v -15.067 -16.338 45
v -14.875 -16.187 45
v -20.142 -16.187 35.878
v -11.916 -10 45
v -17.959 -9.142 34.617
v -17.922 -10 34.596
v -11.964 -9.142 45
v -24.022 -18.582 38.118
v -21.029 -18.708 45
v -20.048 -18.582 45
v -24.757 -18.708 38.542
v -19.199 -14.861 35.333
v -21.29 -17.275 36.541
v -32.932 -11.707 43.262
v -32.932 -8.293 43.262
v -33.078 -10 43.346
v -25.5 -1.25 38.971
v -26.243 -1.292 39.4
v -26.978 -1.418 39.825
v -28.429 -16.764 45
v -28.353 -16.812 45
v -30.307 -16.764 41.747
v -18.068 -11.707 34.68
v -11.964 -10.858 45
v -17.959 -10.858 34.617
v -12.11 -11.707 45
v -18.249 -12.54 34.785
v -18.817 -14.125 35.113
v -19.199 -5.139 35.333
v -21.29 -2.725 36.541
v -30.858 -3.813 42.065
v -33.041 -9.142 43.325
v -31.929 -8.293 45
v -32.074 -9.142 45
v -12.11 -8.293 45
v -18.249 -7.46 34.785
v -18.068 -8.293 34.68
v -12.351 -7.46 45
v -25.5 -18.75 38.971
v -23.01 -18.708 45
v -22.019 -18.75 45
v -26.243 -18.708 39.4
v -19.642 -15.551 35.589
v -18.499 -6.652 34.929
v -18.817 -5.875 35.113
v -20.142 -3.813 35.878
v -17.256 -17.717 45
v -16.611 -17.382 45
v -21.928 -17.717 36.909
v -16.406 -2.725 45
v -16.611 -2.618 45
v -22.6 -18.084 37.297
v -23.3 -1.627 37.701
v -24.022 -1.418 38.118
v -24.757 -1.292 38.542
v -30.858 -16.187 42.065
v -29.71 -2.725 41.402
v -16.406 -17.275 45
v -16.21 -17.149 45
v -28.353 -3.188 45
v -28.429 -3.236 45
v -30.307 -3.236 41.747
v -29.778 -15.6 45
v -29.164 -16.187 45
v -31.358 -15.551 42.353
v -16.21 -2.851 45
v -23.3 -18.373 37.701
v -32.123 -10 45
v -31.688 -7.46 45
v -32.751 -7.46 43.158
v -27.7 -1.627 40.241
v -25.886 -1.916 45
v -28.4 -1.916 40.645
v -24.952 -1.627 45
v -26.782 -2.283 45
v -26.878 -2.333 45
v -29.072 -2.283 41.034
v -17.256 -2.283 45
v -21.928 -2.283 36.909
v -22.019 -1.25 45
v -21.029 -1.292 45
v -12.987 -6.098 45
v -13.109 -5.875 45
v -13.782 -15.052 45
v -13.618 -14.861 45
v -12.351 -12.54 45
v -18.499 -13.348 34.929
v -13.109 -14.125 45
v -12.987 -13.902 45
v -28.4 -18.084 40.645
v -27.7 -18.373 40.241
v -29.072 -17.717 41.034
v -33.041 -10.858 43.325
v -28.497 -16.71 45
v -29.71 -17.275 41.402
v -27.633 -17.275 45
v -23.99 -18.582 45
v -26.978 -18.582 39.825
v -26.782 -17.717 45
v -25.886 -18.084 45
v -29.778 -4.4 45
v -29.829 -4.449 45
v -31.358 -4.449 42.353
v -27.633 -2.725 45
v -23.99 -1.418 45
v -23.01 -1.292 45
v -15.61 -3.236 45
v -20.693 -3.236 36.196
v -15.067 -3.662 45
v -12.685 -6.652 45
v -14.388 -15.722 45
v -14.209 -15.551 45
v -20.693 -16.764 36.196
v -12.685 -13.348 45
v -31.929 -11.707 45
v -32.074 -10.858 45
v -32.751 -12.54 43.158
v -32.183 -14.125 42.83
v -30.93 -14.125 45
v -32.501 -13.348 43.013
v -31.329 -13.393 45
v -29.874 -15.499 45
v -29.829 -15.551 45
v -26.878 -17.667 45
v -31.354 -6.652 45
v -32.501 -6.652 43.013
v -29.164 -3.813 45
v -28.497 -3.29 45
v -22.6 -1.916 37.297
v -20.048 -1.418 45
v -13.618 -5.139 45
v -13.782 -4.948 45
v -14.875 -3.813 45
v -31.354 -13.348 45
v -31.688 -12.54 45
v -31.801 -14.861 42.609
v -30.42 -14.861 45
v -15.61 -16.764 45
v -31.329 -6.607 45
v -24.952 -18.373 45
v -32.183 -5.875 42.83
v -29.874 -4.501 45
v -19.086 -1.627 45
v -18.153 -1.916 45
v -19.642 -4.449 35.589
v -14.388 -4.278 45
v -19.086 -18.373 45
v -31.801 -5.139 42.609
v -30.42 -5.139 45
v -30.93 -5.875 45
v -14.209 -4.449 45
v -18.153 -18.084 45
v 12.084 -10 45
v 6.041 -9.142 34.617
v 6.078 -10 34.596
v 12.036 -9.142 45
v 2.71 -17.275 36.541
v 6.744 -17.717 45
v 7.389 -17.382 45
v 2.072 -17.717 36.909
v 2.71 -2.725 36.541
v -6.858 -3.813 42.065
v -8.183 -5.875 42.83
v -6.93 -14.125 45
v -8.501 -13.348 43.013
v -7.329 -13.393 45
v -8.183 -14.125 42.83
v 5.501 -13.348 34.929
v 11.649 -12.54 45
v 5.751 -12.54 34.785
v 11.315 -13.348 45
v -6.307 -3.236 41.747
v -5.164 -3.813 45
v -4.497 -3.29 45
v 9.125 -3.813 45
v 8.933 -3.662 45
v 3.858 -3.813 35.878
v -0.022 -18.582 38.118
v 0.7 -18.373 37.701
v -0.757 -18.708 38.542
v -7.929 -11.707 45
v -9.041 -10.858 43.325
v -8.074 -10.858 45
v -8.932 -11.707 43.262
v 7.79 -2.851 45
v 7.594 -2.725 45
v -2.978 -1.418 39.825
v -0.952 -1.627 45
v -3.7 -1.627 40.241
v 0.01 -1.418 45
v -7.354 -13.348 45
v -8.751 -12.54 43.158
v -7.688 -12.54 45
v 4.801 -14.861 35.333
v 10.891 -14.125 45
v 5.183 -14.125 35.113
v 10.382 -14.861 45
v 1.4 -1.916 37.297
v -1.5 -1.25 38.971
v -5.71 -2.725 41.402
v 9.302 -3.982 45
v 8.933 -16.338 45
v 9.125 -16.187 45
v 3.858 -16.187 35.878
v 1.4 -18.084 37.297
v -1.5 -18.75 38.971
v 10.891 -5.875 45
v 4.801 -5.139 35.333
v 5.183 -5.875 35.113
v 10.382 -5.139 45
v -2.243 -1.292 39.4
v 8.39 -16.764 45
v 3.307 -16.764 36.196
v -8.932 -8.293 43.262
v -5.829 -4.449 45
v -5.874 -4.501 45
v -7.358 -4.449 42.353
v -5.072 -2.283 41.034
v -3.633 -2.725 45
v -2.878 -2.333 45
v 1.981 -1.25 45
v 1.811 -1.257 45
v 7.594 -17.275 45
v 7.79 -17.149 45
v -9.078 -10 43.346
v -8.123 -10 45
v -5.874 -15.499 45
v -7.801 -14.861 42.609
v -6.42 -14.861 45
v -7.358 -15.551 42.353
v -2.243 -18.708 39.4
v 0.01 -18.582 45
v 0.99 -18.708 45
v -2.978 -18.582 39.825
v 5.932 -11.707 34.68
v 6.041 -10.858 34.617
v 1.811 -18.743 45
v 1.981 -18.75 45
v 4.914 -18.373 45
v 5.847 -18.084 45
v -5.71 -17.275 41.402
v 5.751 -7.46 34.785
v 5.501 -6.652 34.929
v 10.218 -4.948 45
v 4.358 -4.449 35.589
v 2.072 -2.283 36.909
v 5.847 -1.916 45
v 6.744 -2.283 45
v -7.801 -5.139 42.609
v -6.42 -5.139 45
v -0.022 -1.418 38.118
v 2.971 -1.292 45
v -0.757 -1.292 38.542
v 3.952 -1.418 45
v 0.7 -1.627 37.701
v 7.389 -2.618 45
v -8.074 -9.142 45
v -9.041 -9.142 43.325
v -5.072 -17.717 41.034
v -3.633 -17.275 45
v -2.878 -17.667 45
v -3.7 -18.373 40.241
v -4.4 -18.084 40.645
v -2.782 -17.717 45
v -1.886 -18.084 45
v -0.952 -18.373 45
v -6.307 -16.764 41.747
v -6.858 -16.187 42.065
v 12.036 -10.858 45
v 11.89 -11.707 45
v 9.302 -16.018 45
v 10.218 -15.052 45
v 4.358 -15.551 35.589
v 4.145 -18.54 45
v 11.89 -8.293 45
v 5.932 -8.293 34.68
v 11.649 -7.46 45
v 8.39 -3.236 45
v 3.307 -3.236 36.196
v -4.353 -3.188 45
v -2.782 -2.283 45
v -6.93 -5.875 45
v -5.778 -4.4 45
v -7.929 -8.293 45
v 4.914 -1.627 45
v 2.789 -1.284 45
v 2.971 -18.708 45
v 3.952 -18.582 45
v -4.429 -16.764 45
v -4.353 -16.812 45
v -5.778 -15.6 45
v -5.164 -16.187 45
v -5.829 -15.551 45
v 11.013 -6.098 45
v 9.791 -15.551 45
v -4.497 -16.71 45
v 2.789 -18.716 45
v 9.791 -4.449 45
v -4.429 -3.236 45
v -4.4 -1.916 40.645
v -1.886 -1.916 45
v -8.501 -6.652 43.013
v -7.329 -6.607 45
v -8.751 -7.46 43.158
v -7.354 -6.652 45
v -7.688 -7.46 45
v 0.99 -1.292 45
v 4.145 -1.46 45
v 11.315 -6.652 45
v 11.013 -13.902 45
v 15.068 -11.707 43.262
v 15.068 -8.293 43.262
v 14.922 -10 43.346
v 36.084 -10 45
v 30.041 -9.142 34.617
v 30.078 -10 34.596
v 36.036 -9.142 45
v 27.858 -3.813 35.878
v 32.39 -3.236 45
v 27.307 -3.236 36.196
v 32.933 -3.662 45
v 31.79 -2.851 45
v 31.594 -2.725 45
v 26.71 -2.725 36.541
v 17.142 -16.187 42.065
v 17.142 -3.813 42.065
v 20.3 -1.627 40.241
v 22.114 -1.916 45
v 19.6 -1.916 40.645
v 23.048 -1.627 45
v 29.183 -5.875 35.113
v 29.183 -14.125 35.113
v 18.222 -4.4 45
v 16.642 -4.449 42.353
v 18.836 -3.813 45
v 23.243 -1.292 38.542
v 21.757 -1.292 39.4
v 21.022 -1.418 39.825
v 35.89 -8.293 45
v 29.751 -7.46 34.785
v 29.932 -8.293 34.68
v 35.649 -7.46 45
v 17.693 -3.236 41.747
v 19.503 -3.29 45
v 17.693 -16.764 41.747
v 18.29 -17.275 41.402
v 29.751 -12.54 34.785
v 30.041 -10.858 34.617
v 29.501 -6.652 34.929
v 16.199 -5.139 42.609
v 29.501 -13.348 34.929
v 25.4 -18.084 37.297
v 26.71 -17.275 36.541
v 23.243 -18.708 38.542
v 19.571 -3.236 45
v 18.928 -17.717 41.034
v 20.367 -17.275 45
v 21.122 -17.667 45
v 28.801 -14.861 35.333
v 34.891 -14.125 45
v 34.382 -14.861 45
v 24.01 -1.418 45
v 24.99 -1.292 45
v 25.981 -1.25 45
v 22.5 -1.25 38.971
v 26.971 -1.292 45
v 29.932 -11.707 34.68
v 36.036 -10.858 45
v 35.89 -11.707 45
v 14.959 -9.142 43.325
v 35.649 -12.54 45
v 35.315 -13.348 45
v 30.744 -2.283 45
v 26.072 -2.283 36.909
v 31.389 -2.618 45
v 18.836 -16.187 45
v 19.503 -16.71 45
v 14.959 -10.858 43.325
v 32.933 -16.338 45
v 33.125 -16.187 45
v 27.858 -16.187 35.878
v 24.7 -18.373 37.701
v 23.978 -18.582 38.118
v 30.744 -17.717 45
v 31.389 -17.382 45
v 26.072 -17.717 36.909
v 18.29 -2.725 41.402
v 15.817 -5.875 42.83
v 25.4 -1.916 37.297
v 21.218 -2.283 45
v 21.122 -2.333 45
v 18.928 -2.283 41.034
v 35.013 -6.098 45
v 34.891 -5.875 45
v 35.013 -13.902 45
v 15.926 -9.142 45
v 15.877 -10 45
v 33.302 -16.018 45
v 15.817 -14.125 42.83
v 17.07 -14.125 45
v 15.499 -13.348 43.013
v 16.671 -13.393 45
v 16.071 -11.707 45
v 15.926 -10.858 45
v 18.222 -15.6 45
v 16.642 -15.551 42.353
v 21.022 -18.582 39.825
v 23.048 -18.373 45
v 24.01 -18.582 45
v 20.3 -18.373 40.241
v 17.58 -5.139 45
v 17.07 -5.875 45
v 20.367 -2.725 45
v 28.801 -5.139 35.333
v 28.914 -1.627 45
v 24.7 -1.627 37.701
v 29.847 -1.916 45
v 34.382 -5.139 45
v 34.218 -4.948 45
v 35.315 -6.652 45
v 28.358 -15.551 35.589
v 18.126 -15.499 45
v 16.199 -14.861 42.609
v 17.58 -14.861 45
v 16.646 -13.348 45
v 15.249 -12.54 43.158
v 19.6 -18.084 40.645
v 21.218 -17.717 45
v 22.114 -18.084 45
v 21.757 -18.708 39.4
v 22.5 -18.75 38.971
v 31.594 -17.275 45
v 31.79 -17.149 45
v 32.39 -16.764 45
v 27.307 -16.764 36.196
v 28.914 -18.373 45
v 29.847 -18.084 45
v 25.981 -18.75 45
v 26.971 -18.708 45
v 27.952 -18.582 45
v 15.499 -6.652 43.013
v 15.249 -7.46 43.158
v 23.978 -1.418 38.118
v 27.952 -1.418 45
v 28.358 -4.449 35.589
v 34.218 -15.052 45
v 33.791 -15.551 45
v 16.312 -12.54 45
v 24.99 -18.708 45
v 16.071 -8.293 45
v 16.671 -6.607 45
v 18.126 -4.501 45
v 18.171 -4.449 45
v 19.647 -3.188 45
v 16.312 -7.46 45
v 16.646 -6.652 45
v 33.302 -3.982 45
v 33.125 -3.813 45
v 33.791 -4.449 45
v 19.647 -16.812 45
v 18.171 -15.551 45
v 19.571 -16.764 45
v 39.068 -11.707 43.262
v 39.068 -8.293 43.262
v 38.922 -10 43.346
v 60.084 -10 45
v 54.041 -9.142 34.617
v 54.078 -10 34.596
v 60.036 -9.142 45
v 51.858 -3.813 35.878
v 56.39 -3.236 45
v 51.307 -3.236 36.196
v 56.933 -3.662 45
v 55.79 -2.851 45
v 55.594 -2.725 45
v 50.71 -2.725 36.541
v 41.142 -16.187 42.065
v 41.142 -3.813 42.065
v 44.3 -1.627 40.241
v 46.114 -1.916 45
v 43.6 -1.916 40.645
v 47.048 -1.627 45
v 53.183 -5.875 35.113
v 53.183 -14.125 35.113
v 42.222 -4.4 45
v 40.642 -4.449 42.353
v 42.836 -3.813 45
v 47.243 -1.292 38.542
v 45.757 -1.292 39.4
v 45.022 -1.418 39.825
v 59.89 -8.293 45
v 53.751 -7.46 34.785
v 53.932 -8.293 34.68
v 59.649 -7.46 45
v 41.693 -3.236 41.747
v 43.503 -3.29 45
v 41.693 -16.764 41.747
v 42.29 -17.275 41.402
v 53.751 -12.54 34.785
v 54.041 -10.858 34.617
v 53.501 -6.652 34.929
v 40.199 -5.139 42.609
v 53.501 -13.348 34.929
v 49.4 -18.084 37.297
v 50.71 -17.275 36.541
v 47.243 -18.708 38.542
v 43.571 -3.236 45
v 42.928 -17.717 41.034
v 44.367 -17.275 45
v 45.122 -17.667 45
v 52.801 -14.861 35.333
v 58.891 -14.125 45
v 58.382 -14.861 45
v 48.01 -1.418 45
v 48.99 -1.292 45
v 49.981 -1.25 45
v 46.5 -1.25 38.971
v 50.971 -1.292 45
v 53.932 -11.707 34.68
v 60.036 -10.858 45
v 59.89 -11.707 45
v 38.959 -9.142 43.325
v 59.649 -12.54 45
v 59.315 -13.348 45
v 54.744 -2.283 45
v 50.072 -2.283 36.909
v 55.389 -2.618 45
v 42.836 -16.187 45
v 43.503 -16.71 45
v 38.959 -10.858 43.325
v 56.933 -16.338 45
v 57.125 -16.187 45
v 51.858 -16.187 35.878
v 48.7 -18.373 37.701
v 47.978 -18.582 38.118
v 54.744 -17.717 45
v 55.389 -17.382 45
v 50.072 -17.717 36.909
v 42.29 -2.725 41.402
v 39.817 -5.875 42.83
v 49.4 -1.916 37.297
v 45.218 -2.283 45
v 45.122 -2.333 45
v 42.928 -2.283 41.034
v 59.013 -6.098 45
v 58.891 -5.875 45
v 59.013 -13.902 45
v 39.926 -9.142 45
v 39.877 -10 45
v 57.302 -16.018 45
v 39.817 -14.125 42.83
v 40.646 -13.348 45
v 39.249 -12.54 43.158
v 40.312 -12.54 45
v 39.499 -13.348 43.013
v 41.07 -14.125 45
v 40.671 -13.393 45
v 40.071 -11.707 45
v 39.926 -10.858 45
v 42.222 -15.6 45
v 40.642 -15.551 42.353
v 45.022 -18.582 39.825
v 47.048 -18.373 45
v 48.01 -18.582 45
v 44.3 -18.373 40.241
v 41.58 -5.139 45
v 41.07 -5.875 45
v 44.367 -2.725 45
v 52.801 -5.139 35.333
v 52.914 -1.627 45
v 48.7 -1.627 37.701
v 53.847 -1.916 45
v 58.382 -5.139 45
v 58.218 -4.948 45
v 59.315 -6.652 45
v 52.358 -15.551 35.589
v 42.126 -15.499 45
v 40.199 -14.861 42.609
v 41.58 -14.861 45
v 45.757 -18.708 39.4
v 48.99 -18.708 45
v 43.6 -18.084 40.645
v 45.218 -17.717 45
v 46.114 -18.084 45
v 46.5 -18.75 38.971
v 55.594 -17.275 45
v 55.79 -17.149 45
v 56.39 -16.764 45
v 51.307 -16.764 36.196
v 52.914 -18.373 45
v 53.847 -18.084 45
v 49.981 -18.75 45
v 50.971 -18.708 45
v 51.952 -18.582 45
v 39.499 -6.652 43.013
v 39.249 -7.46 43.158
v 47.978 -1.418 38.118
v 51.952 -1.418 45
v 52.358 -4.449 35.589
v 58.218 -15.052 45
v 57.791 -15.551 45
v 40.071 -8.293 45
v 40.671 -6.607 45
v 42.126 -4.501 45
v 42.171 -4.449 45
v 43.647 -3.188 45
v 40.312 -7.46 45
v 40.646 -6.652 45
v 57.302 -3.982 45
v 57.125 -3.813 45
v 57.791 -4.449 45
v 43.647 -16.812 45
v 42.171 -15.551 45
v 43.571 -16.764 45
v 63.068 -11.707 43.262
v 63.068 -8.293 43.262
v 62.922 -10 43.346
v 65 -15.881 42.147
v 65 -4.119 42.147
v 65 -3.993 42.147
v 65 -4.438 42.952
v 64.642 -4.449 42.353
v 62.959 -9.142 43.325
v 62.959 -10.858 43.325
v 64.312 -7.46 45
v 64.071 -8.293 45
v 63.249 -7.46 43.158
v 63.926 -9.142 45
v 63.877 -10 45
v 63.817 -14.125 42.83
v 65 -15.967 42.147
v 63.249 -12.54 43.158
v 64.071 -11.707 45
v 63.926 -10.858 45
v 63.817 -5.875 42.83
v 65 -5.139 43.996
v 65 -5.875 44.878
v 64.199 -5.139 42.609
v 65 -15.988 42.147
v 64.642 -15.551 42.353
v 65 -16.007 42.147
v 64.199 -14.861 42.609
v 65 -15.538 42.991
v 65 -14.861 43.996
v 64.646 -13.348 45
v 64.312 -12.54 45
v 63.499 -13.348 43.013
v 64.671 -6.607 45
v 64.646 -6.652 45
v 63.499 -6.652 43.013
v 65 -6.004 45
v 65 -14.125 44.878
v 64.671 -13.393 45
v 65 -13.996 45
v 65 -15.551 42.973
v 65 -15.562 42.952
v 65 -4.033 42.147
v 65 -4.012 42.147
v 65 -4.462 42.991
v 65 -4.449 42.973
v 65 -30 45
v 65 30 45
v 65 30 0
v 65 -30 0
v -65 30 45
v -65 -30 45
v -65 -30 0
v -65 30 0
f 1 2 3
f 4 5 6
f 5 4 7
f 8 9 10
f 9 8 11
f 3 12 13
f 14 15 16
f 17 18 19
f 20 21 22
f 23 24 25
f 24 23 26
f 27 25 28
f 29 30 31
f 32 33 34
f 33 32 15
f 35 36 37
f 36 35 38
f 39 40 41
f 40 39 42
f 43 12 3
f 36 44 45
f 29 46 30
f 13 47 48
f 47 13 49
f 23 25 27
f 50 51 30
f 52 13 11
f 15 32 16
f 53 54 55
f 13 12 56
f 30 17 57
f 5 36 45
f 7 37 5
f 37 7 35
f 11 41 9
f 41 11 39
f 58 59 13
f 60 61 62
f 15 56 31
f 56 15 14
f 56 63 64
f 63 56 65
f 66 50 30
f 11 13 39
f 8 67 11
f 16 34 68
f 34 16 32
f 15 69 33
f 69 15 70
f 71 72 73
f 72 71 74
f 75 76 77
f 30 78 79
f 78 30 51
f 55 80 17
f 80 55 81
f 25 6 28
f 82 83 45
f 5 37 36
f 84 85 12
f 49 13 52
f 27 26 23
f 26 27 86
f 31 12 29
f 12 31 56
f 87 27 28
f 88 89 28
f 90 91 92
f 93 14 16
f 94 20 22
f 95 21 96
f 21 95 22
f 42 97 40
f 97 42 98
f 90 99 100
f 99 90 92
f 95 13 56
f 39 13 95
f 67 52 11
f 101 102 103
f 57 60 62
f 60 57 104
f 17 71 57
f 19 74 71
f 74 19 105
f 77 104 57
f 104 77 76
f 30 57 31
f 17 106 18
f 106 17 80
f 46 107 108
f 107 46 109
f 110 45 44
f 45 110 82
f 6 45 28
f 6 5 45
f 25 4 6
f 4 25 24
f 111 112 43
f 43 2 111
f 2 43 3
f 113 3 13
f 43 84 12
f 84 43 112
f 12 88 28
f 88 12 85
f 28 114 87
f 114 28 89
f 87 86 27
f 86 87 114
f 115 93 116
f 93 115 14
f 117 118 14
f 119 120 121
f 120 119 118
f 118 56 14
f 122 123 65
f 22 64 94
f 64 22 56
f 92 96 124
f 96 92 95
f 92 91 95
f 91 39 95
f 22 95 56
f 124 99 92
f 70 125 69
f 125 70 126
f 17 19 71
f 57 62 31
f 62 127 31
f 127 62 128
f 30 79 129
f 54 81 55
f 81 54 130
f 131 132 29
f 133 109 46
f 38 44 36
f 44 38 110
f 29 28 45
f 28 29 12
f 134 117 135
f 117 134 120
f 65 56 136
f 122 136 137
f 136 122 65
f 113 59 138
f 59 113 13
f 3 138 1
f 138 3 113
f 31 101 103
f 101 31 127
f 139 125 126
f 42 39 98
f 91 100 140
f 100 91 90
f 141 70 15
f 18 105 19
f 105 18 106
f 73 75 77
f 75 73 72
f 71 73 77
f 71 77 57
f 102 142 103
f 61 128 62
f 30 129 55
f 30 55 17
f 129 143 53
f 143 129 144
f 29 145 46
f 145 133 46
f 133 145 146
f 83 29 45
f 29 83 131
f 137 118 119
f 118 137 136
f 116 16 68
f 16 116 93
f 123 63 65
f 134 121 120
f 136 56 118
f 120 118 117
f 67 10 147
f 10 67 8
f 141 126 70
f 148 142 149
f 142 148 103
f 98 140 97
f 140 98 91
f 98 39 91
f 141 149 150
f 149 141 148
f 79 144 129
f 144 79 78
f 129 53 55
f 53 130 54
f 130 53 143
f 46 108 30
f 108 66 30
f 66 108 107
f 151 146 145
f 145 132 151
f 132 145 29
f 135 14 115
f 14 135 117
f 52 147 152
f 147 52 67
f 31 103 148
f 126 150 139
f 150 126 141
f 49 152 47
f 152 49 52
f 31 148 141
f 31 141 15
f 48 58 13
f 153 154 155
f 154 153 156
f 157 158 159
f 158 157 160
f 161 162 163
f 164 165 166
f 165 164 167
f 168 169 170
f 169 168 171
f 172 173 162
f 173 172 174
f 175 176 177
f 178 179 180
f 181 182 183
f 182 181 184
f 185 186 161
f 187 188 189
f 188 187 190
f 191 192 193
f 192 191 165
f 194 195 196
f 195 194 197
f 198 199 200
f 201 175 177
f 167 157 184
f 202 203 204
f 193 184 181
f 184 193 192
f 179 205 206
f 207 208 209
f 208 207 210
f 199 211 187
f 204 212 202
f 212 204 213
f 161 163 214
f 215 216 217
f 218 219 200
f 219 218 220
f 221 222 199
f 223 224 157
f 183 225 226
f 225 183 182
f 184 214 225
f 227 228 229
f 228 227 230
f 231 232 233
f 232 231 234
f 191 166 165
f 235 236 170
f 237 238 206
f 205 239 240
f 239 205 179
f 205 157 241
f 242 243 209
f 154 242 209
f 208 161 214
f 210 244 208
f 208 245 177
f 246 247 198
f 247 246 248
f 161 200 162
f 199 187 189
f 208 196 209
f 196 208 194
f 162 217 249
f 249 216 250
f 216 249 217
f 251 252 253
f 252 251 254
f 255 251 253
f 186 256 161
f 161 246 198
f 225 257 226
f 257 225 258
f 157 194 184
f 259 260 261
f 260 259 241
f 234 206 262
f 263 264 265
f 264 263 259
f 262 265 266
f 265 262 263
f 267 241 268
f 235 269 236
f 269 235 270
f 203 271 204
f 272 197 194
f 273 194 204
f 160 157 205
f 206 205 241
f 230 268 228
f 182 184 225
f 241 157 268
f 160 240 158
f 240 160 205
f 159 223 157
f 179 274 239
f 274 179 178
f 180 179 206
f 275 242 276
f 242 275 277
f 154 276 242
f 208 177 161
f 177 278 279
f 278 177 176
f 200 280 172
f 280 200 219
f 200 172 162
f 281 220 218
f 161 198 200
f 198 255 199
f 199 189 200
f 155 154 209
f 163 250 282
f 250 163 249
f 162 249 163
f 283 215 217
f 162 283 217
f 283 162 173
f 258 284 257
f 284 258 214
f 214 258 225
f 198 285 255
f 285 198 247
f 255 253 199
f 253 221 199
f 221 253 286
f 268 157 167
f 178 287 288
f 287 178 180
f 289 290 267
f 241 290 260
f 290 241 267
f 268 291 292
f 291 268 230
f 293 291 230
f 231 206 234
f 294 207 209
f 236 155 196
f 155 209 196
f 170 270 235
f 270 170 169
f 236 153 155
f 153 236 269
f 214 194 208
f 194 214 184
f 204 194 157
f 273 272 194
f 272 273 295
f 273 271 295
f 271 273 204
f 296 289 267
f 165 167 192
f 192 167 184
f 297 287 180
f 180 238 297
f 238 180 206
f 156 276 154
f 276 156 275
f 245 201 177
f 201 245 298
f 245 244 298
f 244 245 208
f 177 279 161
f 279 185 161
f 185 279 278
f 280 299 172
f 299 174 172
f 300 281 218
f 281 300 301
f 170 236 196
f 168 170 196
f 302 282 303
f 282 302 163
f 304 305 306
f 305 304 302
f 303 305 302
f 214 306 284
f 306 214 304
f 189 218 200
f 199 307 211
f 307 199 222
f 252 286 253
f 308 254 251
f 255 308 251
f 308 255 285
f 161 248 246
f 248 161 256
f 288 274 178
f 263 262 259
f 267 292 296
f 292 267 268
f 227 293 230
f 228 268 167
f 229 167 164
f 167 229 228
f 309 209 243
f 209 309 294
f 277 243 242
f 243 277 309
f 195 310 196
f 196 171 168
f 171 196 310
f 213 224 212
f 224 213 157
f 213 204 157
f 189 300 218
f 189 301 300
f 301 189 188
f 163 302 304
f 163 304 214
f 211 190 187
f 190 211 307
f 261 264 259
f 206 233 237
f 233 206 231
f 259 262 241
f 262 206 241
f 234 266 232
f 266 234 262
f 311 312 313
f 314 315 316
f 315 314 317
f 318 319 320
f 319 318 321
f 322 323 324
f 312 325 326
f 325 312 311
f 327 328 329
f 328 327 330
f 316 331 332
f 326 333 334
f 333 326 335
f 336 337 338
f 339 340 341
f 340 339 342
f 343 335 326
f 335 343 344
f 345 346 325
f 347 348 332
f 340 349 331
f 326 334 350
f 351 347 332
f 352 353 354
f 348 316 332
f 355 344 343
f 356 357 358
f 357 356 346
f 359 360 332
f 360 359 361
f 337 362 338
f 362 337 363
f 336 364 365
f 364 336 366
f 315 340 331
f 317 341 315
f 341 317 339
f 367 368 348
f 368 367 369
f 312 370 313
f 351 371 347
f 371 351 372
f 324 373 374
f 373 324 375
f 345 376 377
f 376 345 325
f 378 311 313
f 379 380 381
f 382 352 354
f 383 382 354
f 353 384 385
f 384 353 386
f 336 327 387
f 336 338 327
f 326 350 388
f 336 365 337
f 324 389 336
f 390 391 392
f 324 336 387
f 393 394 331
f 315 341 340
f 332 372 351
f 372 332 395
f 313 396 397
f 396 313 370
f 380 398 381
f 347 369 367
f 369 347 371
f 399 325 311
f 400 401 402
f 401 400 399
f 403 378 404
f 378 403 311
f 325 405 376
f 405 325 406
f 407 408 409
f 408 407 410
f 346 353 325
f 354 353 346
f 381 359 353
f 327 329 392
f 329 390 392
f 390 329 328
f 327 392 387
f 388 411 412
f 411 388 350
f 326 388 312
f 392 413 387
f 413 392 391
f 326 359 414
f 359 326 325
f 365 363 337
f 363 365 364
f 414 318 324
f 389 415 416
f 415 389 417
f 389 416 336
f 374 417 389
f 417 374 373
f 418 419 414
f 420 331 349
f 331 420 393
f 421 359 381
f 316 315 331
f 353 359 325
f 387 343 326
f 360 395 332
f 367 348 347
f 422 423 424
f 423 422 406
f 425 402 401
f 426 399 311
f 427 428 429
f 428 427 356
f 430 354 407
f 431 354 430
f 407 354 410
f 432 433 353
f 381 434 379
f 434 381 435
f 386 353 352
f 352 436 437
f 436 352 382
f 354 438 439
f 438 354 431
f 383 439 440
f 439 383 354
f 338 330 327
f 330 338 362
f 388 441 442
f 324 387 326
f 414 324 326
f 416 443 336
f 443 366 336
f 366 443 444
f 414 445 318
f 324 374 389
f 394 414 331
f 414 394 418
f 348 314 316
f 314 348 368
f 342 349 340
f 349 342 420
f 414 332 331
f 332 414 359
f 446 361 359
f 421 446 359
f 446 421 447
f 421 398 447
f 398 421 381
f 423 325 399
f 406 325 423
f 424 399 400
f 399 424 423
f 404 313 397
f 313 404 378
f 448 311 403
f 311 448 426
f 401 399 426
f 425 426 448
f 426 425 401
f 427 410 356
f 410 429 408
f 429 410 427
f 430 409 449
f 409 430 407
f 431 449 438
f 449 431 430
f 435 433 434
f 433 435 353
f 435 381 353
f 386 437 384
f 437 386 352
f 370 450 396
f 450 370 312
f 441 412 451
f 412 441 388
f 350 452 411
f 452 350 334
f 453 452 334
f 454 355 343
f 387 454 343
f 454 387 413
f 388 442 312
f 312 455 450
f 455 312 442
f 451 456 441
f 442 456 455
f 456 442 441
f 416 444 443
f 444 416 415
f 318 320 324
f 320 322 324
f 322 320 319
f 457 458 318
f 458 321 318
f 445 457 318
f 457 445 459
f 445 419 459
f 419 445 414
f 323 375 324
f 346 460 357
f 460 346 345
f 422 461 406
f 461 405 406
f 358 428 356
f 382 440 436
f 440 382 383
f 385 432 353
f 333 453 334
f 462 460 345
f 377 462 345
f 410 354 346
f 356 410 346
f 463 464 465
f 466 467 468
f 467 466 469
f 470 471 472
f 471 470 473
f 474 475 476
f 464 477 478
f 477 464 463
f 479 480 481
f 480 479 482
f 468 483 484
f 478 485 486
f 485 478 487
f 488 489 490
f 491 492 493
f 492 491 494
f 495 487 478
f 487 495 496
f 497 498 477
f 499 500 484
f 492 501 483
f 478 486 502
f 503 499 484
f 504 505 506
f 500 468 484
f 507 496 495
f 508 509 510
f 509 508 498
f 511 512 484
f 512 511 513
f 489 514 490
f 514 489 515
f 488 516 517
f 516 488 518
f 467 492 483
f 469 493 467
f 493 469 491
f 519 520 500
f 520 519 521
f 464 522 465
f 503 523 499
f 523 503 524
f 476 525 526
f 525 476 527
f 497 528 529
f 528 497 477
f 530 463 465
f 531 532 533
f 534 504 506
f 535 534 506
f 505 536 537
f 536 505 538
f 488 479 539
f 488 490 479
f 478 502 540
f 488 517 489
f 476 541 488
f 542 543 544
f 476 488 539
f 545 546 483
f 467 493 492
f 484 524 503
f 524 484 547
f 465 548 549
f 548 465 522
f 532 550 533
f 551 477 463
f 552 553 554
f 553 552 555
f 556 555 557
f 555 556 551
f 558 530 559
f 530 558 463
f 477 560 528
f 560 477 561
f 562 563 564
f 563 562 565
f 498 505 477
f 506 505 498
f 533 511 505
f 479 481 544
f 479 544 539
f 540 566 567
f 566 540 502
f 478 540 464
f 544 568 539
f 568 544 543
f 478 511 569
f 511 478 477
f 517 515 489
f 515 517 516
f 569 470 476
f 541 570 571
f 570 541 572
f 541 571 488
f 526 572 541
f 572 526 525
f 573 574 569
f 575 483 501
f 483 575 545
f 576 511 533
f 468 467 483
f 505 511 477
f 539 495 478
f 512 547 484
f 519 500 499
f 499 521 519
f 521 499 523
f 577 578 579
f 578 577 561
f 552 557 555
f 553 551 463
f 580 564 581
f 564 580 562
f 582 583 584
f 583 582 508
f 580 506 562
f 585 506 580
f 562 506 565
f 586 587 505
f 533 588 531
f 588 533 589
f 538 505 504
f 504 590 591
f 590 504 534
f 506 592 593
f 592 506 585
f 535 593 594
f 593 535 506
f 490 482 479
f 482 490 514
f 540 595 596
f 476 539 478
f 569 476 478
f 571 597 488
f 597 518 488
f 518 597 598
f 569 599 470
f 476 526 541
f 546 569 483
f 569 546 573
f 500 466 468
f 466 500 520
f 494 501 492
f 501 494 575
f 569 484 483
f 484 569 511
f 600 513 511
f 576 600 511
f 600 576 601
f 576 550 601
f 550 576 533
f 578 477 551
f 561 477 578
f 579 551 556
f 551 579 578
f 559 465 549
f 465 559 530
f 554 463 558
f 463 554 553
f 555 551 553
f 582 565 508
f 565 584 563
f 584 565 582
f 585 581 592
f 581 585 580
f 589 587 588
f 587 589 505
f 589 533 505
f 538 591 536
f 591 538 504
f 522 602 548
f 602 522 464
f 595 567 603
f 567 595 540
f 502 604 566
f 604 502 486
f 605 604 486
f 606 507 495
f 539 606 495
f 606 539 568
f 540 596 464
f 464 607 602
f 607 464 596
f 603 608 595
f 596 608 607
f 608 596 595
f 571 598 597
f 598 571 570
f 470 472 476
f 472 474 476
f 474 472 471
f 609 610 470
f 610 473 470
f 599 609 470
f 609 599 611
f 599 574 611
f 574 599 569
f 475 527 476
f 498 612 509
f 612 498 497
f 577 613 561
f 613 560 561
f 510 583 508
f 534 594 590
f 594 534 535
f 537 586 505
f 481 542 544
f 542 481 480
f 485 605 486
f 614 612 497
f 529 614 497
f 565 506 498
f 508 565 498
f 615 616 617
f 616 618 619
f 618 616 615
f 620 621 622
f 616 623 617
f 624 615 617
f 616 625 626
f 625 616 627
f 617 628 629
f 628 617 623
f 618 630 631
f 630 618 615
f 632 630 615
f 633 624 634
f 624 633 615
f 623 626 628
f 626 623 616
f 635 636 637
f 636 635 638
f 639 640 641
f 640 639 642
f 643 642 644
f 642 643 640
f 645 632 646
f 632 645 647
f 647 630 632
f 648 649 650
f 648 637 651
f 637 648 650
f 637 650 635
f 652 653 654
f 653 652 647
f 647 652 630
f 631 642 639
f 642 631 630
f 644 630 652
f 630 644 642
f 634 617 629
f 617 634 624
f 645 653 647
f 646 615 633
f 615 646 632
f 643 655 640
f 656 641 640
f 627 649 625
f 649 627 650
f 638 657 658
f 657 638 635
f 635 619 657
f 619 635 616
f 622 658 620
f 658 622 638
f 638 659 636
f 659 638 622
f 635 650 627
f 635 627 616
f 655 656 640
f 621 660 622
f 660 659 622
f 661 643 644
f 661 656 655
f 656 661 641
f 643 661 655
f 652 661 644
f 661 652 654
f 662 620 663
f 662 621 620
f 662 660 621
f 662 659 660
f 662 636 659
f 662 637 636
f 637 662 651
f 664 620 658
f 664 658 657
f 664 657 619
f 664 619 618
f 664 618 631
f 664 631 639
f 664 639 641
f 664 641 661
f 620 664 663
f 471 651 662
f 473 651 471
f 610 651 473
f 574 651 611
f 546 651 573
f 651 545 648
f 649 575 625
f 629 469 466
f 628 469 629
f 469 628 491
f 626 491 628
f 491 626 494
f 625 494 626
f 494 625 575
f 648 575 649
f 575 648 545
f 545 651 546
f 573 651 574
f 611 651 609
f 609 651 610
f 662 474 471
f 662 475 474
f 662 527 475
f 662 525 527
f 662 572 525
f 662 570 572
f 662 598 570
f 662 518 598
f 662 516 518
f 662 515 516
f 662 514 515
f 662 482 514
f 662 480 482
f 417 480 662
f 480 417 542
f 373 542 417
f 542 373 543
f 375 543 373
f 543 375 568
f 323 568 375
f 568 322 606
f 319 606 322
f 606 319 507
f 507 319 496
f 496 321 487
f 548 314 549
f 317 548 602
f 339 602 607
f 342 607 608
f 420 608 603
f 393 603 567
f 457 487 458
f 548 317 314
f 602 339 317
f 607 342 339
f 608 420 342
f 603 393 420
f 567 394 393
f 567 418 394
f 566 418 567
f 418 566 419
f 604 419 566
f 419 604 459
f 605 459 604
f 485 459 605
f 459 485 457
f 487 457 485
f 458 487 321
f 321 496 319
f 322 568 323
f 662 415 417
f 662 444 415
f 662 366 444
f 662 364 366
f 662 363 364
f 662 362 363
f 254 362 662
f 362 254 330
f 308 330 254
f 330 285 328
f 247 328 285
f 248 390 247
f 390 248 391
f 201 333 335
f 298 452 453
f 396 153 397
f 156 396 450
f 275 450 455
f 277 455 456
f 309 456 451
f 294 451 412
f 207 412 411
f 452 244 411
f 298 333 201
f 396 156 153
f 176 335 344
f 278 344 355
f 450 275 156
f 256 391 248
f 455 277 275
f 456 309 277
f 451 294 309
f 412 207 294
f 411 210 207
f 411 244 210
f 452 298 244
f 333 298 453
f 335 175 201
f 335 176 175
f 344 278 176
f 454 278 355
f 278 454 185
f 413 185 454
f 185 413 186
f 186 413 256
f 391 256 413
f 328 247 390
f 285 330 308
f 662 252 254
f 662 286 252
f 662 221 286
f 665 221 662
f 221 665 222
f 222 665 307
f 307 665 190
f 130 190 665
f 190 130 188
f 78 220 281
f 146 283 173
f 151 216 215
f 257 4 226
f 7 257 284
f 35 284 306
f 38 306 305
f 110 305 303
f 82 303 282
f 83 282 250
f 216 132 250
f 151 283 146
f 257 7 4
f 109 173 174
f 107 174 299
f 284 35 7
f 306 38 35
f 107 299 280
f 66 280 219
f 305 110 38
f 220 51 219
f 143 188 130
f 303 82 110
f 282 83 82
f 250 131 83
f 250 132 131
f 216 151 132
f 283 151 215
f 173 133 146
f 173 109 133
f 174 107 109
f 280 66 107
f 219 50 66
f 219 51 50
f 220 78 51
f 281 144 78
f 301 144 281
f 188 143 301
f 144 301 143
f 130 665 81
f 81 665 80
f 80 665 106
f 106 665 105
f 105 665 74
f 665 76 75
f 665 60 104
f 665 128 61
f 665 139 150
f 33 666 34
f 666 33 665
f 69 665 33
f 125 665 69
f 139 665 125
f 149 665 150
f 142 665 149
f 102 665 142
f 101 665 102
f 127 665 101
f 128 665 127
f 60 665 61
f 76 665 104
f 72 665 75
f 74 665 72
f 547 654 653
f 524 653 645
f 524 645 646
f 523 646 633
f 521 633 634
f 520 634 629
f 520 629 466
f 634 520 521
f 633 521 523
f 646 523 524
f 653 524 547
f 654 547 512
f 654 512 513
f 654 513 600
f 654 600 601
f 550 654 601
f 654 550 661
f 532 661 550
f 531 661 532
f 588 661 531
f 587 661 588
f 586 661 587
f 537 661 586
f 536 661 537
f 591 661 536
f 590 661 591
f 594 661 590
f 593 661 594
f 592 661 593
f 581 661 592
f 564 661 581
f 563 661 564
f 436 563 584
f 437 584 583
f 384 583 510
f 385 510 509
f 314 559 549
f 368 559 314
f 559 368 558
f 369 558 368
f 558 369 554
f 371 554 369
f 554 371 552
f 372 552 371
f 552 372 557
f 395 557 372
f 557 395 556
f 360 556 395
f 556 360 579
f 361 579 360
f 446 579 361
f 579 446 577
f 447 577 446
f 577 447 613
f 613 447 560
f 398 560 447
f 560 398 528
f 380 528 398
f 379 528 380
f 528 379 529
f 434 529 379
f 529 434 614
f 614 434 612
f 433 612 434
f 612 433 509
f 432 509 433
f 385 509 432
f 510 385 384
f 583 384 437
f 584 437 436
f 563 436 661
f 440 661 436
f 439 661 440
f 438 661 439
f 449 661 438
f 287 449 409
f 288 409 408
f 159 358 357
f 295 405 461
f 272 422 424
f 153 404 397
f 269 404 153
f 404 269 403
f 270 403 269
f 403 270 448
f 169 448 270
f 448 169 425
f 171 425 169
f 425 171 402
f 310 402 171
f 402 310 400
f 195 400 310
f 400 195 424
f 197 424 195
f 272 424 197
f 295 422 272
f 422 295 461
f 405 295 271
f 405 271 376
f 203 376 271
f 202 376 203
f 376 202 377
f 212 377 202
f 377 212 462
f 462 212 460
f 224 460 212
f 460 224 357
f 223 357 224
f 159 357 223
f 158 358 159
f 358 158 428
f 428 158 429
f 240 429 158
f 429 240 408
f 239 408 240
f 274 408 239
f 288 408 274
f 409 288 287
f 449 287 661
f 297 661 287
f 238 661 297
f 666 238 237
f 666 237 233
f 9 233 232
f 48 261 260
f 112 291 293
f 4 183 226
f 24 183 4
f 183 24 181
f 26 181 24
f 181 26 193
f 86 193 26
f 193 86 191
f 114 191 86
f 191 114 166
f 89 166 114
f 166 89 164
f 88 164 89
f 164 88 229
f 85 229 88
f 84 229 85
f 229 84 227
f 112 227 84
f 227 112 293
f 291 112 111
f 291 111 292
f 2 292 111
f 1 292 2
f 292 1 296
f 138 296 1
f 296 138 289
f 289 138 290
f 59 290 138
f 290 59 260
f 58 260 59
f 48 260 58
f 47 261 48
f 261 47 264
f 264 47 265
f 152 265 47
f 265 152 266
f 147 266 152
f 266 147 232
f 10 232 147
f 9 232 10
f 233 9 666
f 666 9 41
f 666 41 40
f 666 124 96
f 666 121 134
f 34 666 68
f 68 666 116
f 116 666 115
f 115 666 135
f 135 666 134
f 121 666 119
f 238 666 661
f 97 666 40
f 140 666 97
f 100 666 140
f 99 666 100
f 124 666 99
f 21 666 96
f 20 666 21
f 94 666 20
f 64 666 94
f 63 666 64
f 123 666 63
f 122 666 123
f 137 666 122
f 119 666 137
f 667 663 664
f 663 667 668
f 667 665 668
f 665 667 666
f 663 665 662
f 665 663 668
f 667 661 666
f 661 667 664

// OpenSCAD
// 15 mL conical tube rack – 5 tubes, 30° lean, for volume reading / supernatant pipetting
// Units: mm. Part rests on the XY plane (z = 0) and is centred on the origin in X and Y.

// ---- Block dimensions (measured with calipers) ----
L = 130;   // block length along X
W = 60;    // block depth along Y
H = 45;    // block height along Z

// ---- Hole / tube parameters ----
n_tubes   = 5;    // number of tubes
spacing   = 24;   // centre-to-centre spacing of hole axes along X
hole_d    = 17.5; // hole diameter, measured square to its axis
hole_depth= 40;   // hole depth measured along its axis, from the top face
y_top     = -10;  // Y coordinate where each hole axis meets the top face (z = H)
tilt      = 30;   // lean angle from vertical, in the YZ plane (down into block -> +Y)

// ---- Derived geometry ----
// A 30° tilt from vertical means the axis makes 60° with the +Z axis,
// so the unit vector pointing down into the block is (0, sin60, -cos60).
down_vec  = [0, sin(60), -cos(60)];   // direction from top face into the block
top_pt    = [0, y_top, H];            // point where the axis meets the top face
bot_pt    = top_pt + hole_depth * down_vec; // flat bottom of the blind hole

// ---- Build ----
$fn = 64;

difference() {
    // Solid block, centred on the origin in X and Y, resting on z = 0
    translate([-L/2, -W/2, 0])
        cube([L, W, H]);

    // Five blind holes, each a cylinder with a flat end square to its axis
    for (i = [0 : n_tubes - 1]) {
        x = (i - (n_tubes - 1) / 2) * spacing;   // centred on the block in X
        translate([x, 0, 0])
            rotate([0, tilt, 0])                 // tilt the axis 30° in the YZ plane
            translate([0, y_top, H])             // axis meets the top face at y = -10
            cylinder(h = hole_depth, r = hole_d / 2, $fn = 64);
    }
}
